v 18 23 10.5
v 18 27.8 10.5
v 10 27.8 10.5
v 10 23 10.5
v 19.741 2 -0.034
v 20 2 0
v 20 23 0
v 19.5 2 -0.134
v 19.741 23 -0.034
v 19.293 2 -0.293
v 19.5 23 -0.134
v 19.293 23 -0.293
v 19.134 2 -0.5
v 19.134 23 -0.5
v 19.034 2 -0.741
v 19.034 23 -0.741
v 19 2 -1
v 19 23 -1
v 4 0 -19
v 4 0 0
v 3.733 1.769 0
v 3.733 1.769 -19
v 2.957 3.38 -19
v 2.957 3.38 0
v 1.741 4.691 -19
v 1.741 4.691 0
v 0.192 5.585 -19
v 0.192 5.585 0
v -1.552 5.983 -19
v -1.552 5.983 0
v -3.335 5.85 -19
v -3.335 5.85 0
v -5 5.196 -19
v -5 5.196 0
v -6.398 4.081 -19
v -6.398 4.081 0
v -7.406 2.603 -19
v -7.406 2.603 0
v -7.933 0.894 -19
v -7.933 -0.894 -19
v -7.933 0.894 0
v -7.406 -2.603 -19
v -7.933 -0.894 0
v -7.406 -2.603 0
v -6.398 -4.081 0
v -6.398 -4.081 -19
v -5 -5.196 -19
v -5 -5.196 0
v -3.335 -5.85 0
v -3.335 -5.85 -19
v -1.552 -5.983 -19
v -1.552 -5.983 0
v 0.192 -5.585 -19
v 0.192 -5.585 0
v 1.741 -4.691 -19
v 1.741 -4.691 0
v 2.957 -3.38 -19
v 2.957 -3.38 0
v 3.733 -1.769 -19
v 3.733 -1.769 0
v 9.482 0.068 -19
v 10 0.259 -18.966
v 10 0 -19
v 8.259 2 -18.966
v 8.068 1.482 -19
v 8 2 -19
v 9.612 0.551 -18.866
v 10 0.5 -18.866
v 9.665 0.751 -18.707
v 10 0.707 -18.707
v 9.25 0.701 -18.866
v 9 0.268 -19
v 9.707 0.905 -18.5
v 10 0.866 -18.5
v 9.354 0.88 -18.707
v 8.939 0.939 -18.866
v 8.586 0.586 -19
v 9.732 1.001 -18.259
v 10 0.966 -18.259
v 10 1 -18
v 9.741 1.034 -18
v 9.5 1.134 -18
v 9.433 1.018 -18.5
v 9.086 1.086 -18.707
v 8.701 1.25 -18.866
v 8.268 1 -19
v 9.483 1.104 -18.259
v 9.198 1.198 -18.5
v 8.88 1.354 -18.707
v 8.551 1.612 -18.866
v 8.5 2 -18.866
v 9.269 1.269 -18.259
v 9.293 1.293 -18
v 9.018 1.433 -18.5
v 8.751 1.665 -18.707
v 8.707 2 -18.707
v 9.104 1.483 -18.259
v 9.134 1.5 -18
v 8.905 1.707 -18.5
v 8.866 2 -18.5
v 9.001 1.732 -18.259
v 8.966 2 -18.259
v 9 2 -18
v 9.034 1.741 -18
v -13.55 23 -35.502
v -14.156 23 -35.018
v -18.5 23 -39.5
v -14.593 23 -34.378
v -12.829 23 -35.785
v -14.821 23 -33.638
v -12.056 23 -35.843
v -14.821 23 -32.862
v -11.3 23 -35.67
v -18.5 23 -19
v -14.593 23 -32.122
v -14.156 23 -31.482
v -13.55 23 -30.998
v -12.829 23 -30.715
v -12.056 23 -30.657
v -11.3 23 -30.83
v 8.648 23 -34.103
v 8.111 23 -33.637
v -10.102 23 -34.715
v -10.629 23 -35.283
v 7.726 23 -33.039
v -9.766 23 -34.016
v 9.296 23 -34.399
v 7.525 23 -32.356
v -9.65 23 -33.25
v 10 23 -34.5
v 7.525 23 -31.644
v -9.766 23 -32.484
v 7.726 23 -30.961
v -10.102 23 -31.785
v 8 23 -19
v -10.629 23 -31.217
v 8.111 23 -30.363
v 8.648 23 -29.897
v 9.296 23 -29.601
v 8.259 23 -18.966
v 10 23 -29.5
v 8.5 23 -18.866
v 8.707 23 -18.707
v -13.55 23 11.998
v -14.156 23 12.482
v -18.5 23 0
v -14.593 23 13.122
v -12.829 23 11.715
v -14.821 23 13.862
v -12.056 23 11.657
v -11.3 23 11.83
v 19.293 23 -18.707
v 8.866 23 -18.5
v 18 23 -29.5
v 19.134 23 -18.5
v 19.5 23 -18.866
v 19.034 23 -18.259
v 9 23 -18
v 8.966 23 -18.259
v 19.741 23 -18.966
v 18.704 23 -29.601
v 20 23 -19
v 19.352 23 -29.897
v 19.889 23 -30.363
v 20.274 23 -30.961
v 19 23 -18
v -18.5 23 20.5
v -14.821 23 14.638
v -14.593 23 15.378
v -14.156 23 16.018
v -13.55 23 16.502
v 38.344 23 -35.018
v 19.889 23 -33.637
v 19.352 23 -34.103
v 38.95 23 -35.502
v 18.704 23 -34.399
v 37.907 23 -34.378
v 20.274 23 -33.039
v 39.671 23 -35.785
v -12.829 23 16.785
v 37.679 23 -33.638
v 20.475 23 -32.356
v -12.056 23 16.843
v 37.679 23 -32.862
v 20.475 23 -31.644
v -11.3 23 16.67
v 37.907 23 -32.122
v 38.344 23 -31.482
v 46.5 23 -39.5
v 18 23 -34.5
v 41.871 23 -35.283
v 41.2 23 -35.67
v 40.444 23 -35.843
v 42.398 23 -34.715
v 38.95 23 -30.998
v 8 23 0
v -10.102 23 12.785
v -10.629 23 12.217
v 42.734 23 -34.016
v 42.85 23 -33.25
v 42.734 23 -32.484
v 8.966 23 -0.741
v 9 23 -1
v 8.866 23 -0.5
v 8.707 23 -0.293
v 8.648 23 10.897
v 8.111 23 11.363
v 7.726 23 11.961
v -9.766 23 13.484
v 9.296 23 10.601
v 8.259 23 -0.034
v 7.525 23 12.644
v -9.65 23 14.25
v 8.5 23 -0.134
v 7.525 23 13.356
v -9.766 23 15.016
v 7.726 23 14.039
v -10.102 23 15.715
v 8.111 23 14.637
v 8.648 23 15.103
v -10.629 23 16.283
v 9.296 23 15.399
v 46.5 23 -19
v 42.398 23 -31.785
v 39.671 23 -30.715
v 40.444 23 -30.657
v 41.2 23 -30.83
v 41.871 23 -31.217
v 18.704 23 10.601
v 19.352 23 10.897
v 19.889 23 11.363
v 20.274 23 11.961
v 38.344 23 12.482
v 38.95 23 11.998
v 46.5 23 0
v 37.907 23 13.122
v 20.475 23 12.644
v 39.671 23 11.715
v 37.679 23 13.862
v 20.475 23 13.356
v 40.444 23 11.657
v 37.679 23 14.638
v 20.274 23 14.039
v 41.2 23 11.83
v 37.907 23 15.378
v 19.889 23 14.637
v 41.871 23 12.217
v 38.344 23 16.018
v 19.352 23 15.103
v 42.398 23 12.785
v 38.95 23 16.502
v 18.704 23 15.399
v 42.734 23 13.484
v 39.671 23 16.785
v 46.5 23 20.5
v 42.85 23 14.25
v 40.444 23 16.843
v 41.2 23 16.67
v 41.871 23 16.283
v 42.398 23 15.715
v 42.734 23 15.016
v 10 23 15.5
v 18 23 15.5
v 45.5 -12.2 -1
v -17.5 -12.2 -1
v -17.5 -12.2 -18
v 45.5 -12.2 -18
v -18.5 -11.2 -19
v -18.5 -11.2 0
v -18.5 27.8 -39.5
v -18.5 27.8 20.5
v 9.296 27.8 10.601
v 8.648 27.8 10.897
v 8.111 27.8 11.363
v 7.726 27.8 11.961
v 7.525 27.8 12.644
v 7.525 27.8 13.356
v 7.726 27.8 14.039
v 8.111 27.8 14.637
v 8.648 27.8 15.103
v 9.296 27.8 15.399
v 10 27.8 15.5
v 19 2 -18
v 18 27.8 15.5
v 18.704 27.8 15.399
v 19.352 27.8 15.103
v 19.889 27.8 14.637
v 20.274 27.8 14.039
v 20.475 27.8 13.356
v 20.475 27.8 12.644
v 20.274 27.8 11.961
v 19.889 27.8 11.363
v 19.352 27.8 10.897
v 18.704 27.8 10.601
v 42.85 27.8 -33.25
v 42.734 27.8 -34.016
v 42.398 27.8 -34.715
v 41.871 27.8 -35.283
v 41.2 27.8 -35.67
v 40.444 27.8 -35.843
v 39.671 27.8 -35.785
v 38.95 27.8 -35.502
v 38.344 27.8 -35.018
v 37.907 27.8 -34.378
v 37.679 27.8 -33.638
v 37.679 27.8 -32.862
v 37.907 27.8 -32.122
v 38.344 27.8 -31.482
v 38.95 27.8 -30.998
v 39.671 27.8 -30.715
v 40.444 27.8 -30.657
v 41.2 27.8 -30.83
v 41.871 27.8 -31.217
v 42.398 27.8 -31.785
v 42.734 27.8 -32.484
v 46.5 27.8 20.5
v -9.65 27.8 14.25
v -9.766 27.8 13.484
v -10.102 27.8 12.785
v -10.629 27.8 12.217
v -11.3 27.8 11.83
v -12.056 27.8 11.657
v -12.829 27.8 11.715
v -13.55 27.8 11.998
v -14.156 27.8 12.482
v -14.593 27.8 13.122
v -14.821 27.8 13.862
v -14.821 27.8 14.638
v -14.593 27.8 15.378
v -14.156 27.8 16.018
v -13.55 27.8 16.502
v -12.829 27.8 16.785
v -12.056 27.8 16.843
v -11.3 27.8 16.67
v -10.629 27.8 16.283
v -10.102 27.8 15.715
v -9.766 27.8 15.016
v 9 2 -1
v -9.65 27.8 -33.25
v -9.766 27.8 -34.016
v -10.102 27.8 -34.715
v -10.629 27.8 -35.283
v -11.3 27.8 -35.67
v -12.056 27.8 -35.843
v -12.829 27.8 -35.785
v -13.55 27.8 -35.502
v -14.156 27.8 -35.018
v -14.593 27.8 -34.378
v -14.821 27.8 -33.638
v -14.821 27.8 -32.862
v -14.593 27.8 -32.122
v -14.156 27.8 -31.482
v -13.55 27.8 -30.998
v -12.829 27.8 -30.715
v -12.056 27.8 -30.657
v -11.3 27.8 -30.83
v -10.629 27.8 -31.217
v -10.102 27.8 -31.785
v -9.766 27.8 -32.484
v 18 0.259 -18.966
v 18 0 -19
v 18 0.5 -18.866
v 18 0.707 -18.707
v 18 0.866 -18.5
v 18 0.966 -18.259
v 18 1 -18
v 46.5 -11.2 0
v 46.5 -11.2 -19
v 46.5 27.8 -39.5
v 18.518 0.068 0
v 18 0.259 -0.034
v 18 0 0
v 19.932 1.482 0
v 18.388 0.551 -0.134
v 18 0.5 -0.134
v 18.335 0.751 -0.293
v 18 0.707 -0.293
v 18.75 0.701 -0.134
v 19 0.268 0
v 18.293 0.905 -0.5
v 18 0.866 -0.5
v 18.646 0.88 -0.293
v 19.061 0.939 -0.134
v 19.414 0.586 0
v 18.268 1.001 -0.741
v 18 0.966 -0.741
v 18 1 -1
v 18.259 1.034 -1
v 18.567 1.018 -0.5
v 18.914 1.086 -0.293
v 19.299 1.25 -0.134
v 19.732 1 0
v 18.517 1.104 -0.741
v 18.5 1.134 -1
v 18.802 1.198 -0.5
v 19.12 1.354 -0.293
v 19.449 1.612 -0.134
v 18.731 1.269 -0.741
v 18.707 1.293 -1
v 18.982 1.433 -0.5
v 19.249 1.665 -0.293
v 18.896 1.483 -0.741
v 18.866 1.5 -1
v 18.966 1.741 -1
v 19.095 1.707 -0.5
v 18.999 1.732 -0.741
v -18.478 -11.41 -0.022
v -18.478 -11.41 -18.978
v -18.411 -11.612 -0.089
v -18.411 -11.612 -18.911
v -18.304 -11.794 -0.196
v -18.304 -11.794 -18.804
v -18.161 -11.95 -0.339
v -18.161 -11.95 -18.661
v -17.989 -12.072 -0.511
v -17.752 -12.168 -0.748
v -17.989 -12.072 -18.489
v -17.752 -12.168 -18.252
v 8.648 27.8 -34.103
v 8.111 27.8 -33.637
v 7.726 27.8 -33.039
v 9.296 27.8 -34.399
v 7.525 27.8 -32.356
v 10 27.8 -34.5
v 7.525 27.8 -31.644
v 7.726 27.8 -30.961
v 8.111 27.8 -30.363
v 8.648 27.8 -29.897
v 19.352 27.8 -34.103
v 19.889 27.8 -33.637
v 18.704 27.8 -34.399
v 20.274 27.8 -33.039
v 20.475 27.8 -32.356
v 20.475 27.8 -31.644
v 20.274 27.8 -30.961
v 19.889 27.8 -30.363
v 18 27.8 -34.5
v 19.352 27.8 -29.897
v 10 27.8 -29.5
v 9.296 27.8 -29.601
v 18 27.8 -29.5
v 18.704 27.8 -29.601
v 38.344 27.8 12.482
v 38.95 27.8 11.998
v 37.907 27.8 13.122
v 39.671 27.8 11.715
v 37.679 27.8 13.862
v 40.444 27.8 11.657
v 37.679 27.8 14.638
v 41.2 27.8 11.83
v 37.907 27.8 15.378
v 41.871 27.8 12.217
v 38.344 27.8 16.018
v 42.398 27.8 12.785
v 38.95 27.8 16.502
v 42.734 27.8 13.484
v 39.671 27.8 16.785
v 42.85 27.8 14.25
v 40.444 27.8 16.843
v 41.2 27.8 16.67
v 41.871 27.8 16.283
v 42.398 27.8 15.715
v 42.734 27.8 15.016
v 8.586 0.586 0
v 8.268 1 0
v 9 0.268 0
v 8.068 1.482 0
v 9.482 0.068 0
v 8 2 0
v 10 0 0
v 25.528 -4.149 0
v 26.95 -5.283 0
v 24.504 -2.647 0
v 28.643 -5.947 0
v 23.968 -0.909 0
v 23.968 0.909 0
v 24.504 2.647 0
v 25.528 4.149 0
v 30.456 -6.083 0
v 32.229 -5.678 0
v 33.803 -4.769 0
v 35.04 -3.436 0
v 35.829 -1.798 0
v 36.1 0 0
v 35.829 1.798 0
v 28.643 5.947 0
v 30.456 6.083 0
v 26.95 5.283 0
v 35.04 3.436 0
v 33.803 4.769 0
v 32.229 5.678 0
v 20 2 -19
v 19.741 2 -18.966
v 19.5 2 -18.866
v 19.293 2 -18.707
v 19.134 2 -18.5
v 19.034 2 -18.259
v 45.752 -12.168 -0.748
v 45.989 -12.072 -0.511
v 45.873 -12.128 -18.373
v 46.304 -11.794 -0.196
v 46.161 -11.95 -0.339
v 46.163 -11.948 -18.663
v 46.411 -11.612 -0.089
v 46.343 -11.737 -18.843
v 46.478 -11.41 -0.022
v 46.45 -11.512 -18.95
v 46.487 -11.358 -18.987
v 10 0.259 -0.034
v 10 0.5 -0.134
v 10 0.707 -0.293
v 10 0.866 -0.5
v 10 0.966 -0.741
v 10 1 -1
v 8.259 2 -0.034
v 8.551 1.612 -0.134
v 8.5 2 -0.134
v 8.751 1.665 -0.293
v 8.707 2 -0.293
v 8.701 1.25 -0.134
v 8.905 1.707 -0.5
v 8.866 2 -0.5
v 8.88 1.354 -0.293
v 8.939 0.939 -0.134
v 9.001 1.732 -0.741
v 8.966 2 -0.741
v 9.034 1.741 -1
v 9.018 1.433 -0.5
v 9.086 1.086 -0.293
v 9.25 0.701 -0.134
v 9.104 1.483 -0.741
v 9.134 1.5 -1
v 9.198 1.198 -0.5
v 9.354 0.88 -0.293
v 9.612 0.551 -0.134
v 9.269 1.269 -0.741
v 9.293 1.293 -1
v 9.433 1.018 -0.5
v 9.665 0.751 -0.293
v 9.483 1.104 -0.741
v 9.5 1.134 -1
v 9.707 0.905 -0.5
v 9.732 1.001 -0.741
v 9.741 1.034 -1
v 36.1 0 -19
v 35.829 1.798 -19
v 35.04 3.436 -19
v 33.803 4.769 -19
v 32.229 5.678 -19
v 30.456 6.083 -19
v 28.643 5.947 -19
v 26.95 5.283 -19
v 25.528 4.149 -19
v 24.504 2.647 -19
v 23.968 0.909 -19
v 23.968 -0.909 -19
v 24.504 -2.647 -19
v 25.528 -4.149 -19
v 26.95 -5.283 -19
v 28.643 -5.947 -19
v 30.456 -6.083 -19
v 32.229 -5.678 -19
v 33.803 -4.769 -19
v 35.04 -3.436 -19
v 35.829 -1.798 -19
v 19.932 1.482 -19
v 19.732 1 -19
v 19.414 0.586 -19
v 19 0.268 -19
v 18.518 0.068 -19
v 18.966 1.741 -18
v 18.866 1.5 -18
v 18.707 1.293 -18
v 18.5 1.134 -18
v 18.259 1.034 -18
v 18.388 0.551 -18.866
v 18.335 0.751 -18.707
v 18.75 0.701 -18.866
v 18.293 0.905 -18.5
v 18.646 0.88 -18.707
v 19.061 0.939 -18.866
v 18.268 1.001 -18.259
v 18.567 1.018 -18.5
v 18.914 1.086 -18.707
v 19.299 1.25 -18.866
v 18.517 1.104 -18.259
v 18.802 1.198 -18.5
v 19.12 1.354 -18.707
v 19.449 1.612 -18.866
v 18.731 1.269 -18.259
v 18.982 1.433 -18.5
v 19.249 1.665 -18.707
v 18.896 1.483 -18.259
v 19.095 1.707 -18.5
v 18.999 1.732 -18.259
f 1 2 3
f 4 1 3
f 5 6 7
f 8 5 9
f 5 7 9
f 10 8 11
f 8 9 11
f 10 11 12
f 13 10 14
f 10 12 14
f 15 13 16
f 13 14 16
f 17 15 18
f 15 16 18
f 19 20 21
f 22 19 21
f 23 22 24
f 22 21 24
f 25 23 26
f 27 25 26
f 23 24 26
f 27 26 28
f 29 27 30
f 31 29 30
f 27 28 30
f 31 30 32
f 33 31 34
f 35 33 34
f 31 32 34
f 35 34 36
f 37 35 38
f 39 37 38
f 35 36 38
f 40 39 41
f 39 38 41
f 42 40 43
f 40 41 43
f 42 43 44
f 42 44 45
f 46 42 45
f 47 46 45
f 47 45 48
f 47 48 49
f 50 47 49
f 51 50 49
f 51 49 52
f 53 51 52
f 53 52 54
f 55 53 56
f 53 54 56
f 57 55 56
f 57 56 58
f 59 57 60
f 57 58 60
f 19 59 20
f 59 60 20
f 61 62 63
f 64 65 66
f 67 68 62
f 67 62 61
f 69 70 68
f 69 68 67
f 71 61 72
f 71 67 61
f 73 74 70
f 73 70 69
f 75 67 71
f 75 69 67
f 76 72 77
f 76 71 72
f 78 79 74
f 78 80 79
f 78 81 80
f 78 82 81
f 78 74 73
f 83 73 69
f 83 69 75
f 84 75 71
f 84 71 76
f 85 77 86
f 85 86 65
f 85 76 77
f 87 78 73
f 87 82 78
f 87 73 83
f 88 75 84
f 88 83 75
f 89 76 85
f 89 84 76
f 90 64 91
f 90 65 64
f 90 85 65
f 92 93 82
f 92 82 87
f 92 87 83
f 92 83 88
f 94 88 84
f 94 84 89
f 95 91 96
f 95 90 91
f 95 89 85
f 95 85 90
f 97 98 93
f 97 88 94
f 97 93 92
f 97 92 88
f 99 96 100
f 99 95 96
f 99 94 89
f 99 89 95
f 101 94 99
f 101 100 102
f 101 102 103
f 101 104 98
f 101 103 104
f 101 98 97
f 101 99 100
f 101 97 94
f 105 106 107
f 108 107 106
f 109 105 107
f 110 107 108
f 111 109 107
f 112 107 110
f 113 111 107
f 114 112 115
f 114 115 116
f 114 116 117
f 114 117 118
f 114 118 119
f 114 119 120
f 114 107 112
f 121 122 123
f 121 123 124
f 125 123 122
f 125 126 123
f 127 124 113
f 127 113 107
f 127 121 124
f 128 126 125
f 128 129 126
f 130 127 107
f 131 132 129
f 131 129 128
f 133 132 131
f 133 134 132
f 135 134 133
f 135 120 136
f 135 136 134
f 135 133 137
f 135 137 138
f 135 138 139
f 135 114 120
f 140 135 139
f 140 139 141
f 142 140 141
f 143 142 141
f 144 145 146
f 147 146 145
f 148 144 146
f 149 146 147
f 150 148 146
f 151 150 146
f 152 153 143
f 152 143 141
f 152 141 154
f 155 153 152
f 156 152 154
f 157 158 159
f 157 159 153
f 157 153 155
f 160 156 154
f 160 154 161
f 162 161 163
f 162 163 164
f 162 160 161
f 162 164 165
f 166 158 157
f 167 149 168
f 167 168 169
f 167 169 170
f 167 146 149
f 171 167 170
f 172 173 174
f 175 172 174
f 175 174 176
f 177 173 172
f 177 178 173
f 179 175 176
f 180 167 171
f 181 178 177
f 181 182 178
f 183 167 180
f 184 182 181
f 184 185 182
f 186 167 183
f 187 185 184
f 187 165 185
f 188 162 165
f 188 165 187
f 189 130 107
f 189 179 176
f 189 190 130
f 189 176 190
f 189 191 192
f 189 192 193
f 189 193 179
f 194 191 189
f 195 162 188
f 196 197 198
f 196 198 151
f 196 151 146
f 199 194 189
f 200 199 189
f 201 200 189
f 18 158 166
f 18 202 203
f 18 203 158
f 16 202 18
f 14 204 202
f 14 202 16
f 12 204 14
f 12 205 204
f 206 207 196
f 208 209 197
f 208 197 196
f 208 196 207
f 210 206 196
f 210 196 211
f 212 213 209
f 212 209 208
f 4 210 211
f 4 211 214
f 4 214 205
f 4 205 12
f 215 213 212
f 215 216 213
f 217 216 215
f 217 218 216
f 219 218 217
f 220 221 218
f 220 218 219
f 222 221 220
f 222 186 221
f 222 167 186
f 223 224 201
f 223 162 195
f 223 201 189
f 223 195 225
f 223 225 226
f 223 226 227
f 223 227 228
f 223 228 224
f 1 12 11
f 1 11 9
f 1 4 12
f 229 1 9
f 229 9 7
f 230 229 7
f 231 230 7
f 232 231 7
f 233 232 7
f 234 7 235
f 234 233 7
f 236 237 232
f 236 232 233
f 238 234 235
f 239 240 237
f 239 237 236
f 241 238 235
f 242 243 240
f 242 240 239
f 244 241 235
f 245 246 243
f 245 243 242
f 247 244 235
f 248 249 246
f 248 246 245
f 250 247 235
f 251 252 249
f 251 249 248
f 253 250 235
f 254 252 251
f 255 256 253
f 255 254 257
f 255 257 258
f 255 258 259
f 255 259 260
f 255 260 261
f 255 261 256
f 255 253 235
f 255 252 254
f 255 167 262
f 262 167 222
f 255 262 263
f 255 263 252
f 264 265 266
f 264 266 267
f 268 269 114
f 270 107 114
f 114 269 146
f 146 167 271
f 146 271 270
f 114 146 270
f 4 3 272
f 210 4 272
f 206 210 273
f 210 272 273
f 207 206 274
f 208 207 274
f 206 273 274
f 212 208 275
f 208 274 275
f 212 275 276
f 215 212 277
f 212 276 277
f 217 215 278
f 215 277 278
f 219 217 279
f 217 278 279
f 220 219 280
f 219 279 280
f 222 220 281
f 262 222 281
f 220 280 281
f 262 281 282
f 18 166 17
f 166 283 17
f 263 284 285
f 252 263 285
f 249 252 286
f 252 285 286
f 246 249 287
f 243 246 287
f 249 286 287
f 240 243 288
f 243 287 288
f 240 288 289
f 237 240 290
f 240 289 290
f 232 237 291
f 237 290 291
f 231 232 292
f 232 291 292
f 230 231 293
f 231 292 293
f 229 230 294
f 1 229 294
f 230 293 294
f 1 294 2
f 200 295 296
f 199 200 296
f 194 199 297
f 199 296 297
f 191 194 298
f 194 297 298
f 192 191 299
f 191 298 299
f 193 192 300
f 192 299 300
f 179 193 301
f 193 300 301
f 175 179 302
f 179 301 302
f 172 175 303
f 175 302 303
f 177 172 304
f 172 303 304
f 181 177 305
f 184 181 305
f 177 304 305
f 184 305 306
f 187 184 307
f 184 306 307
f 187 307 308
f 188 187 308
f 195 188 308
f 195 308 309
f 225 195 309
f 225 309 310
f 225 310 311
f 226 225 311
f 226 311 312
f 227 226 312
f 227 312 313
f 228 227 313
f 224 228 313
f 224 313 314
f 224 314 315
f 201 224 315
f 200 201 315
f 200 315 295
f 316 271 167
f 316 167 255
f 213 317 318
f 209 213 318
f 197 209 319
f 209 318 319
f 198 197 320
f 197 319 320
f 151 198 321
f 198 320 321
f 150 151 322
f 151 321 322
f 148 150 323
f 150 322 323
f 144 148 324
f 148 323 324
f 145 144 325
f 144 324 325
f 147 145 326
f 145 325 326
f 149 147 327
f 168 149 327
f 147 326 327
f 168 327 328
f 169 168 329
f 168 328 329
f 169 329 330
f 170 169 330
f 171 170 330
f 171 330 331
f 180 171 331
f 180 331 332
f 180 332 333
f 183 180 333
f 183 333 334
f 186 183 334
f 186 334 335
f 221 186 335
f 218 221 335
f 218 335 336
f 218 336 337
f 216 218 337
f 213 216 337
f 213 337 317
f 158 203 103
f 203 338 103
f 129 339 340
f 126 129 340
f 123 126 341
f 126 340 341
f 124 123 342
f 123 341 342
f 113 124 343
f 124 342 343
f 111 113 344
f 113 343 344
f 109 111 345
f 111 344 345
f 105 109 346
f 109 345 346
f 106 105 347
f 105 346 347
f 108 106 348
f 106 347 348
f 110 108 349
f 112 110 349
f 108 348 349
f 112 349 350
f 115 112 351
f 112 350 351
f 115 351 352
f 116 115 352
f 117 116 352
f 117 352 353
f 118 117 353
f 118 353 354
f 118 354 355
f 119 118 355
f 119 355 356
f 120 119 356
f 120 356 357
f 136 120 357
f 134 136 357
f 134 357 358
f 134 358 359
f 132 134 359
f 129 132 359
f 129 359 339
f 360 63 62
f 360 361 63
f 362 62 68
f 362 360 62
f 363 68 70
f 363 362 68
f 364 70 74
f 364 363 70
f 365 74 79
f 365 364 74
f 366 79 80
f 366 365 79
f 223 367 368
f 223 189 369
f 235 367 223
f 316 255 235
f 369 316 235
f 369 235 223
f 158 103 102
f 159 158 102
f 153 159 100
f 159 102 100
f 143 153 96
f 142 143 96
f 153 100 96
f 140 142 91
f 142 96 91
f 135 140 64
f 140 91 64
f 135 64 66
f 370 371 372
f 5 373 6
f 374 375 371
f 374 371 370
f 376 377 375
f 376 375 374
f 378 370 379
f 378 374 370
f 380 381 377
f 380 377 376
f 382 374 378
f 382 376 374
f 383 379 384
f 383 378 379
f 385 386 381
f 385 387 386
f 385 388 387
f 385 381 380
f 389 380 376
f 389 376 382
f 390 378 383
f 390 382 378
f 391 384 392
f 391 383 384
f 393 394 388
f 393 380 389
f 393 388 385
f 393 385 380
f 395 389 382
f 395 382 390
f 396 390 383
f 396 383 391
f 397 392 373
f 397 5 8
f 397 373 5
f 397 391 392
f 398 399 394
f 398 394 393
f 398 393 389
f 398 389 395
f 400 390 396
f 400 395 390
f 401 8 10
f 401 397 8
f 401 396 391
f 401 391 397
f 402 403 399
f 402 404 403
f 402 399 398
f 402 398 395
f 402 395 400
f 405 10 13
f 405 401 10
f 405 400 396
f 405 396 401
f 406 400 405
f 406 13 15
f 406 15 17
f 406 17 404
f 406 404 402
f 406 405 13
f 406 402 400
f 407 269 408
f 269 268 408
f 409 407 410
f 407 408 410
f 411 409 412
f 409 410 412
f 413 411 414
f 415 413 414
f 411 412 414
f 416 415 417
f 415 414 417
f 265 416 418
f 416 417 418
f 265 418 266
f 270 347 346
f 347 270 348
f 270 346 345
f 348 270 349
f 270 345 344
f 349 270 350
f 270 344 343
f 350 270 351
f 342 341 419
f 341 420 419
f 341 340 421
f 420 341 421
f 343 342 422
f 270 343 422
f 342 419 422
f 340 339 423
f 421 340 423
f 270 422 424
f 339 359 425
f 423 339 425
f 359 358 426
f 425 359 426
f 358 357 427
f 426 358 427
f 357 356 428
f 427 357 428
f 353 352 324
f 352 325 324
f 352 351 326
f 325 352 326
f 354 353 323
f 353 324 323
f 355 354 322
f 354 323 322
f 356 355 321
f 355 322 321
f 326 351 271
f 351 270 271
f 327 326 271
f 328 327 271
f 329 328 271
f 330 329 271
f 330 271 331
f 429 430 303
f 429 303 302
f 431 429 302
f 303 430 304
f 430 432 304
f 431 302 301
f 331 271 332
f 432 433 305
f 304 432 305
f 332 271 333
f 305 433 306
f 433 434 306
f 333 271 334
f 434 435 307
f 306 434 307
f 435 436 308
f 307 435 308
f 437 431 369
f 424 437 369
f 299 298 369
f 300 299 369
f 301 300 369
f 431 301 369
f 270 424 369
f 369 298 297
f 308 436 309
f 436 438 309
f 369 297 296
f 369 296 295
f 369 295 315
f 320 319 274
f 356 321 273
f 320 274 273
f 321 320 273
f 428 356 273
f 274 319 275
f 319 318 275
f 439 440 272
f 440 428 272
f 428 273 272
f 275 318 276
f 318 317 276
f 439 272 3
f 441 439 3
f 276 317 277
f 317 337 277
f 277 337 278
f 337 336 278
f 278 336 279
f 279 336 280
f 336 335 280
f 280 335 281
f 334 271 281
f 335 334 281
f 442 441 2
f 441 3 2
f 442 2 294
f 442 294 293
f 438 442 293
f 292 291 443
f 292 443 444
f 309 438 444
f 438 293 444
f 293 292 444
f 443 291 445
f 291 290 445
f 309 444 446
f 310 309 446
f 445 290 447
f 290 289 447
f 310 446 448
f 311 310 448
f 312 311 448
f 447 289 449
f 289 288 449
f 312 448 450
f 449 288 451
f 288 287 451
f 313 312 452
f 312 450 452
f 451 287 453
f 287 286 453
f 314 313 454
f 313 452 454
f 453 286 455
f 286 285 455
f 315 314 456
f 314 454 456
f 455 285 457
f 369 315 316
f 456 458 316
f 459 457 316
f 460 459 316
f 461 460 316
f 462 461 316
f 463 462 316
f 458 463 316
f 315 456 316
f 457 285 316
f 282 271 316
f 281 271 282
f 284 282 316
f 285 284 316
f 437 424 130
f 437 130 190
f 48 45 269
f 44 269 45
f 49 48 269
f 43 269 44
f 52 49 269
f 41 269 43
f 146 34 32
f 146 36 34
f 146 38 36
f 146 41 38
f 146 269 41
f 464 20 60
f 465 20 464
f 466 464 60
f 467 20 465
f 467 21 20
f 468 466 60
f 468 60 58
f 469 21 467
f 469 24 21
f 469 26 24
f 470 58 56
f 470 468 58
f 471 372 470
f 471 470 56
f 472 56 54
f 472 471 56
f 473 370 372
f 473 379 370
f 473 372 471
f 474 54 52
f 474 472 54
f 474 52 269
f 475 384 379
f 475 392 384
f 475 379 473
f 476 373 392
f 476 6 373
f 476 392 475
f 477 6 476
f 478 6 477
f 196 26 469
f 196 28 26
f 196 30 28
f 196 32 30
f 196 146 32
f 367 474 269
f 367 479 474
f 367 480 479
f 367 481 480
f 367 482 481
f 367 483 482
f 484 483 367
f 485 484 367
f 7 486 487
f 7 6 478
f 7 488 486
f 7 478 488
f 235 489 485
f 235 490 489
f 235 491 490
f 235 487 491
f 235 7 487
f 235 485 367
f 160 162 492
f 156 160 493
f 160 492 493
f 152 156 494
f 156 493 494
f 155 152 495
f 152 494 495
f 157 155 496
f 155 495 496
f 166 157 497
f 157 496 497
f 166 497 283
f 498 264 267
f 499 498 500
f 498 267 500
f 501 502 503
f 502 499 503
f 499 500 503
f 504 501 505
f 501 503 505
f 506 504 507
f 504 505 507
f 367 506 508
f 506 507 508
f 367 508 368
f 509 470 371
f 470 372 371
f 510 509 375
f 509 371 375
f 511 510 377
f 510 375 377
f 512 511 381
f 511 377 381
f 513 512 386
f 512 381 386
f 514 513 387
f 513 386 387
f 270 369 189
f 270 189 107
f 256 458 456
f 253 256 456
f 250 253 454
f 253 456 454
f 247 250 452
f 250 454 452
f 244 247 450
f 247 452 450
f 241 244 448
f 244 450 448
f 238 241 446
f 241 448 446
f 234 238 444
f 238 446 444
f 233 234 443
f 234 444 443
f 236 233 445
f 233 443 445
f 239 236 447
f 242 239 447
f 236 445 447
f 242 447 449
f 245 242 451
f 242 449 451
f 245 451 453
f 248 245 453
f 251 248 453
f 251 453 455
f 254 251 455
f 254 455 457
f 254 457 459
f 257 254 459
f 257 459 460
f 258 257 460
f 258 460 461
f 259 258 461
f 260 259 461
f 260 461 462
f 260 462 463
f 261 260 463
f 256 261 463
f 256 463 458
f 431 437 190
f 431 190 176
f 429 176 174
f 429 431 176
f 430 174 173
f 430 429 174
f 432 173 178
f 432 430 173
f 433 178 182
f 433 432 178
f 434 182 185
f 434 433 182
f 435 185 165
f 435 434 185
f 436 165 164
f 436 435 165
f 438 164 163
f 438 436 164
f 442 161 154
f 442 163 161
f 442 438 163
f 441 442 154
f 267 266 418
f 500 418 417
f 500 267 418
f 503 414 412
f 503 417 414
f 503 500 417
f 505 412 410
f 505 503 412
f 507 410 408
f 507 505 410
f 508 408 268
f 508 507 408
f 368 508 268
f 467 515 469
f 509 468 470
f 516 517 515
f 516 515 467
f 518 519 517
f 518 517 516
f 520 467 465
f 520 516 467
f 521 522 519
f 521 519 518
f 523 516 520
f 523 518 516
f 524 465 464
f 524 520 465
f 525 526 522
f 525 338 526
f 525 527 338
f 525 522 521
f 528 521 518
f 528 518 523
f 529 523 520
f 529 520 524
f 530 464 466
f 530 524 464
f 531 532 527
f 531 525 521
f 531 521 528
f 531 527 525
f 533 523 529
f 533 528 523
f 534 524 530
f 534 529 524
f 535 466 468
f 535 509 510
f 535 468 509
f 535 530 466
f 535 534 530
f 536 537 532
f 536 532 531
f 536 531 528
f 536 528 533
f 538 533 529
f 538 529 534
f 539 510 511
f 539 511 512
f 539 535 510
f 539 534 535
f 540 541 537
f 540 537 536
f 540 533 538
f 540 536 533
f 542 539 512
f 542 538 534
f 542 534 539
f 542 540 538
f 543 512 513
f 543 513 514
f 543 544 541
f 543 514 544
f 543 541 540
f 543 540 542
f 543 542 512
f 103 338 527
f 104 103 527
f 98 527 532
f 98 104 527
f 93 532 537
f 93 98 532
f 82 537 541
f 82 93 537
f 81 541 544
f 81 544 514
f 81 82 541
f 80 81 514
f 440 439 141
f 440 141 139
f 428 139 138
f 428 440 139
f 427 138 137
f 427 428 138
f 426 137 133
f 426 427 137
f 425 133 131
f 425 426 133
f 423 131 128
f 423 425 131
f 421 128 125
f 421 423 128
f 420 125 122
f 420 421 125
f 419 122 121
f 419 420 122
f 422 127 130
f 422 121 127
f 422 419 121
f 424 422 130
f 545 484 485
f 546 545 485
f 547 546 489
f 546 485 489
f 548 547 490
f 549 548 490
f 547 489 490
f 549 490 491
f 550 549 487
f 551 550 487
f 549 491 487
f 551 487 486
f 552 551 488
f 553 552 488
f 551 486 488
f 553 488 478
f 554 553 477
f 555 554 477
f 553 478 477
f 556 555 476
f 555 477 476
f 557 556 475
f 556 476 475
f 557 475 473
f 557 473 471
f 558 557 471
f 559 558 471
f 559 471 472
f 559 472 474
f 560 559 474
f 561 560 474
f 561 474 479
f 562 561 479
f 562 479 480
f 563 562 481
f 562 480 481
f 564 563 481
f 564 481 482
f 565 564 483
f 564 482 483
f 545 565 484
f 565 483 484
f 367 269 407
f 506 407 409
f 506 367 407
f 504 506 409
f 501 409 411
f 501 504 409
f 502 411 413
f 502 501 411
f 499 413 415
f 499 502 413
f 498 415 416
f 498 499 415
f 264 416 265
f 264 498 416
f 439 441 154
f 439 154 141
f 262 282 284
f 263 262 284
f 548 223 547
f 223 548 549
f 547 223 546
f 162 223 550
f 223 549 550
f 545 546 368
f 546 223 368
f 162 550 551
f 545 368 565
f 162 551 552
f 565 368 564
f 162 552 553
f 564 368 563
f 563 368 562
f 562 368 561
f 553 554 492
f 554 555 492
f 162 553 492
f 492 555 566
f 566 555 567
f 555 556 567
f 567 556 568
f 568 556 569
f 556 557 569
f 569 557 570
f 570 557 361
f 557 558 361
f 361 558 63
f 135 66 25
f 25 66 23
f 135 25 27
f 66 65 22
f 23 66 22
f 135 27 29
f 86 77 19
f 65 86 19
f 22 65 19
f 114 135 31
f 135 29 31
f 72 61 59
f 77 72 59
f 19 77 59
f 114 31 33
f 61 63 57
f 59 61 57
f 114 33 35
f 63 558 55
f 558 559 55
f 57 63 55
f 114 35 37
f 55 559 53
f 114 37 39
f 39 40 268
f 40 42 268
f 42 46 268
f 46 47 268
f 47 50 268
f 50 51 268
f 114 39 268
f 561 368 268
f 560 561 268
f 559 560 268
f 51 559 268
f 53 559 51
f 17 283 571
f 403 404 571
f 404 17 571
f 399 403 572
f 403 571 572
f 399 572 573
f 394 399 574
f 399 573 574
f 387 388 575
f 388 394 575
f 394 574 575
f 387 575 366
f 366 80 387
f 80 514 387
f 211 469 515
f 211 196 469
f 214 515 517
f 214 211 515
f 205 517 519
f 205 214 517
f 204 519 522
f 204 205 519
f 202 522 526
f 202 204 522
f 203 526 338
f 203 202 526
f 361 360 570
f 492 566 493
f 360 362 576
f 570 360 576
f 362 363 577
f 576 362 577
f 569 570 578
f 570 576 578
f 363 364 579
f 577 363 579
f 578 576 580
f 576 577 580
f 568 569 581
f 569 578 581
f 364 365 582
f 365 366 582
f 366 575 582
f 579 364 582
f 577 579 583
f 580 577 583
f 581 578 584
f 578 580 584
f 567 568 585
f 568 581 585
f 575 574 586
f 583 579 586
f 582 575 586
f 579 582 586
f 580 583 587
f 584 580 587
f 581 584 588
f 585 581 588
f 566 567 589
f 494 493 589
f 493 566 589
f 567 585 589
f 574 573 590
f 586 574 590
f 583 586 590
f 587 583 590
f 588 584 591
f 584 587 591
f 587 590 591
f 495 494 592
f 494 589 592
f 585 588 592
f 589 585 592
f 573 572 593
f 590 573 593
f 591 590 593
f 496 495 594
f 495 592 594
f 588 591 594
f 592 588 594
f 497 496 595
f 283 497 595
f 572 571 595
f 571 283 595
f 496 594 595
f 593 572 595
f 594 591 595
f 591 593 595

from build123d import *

# Parameters (mm, degrees)
SKETCH1_W           = 65
SKETCH1_H           = 40
SKETCH1_R           = 6
SKETCH1_R_2         = 6.1
BOSS_EXTRUDE1_DEPTH = 19
SKETCH4_W           = 65
SKETCH4_H           = 14.8
BOSS_EXTRUDE2_DEPTH = 35
SKETCH6_W           = 10
SKETCH6_H           = 12
CUT_EXTRUDE1_DEPTH  = 45.5
CUT_EXTRUDE3_DEPTH  = 41
FILLET1_R           = 1
SKETCH9_W           = 65
SKETCH9_H           = 14.8
CUT_EXTRUDE4_DEPTH  = 5
SKETCH10_W          = 65
SKETCH10_H          = 14.8
CUT_EXTRUDE5_DEPTH  = 5
SKETCH11_R          = 2.6
CUT_EXTRUDE6_DEPTH  = 41
CUT_EXTRUDE7_DEPTH  = 10


with BuildPart() as part:
    # Sketch1 → Boss-Extrude1 (new body)
    with BuildSketch(Plane.XY):
        with Locations((14, 7.8)):
            Rectangle(SKETCH1_W, SKETCH1_H)
        with Locations((-2, 0)):
            Circle(SKETCH1_R, mode=Mode.SUBTRACT)
        with Locations((30, 0)):
            Circle(SKETCH1_R_2, mode=Mode.SUBTRACT)
    extrude(amount=-BOSS_EXTRUDE1_DEPTH)

    # Sketch4 → Boss-Extrude2 (add, symmetric)
    with BuildSketch(Plane.XY.offset(-9.5)):
        with Locations((14, 20.4)):
            Rectangle(SKETCH4_W, SKETCH4_H)
    extrude(amount=BOSS_EXTRUDE2_DEPTH, both=True)

    # Sketch6 → Cut-Extrude1 (cut, through all)
    with BuildSketch(Plane.XY):
        with Locations((14, 7)):
            Rectangle(SKETCH6_W, SKETCH6_H)
    extrude(amount=-CUT_EXTRUDE1_DEPTH, mode=Mode.SUBTRACT)

    # Sketch8 → Cut-Extrude3 (cut, through all)
    with BuildSketch(Plane(origin=(0, 27.8, 0), x_dir=(1, 0, 0), z_dir=(0, 1, 0))):
        with BuildLine():
            Line((18, 29.5), (10, 29.5))
            ThreePointArc((10, 29.5), (7.5, 32), (10, 34.5))
            Line((10, 34.5), (18, 34.5))
            ThreePointArc((18, 34.5), (20.5, 32), (18, 29.5))
        make_face()
        with BuildLine():
            Line((18, -10.5), (10, -10.5))
            ThreePointArc((10, -10.5), (7.5, -13), (10, -15.5))
            Line((10, -15.5), (18, -15.5))
            ThreePointArc((18, -15.5), (20.5, -13), (18, -10.5))
        make_face()
    extrude(amount=-CUT_EXTRUDE3_DEPTH, mode=Mode.SUBTRACT)

    # Fillet1
    fillet1_edges = [part.edges().sort_by_distance(p)[0] for p in [
        (14, 1, -19),
        (9, 7, -19),
        (19, 7, -19),
        (9, 1, -9.5),
        (19, 1, -9.5),
        (9, 7, 0),
        (14, 1, 0),
        (19, 7, 0),
        (14, -12.2, 0),
        (46.5, -12.2, -9.5),
        (-18.5, -12.2, -9.5),
        (14, -12.2, -19),
    ]]
    fillet(fillet1_edges, radius=FILLET1_R)

    # Sketch9 → Cut-Extrude4 (cut)
    with BuildSketch(Plane.XY.offset(25.5)):
        with Locations((14, 20.4)):
            Rectangle(SKETCH9_W, SKETCH9_H)
    extrude(amount=-CUT_EXTRUDE4_DEPTH, mode=Mode.SUBTRACT)

    # Sketch10 → Cut-Extrude5 (cut)
    with BuildSketch(Plane(origin=(0, 0, -44.5), x_dir=(-1, 0, 0), z_dir=(0, 0, -1))):
        with Locations((-14, 20.4)):
            Rectangle(SKETCH10_W, SKETCH10_H)
    extrude(amount=-CUT_EXTRUDE5_DEPTH, mode=Mode.SUBTRACT)

    # Sketch11 → Cut-Extrude6 (cut, through all)
    with BuildSketch(Plane(origin=(0, 27.8, 0), x_dir=(1, 0, 0), z_dir=(0, 1, 0))):
        with Locations((40.25, -14.25)):
            Circle(SKETCH11_R)
        with Locations((40.25, 33.25)):
            Circle(SKETCH11_R)
        with Locations((-12.25, 33.25)):
            Circle(SKETCH11_R)
        with Locations((-12.25, -14.25)):
            Circle(SKETCH11_R)
    extrude(amount=-CUT_EXTRUDE6_DEPTH, mode=Mode.SUBTRACT)

    # Sketch12 → Cut-Extrude7 (cut)
    with BuildSketch(Plane.XZ.offset(-13)):
        with BuildLine():
            Line((-18.5, -39.5), (46.5, -39.5))
            Line((46.5, -39.5), (46.5, -19))
            Line((46.5, -19), (20, -19))
            ThreePointArc((20, -19), (19.292893219, -18.707106781), (19, -18))
            Line((19, -18), (19, -1))
            ThreePointArc((19, -1), (19.292893219, -0.292893219), (20, 0))
            Line((20, 0), (46.5, 0))
            Line((46.5, 0), (46.5, 20.5))
            Line((46.5, 20.5), (-18.5, 20.5))
            Line((-18.5, 20.5), (-18.5, 0))
            Line((-18.5, 0), (8, 0))
            ThreePointArc((8, 0), (8.707106781, -0.292893219), (9, -1))
            Line((9, -1), (9, -18))
            ThreePointArc((9, -18), (8.707106781, -18.707106781), (8, -19))
            Line((8, -19), (-18.5, -19))
            Line((-18.5, -19), (-18.5, -39.5))
        make_face()
    extrude(amount=-CUT_EXTRUDE7_DEPTH, mode=Mode.SUBTRACT)


solid = part.part
